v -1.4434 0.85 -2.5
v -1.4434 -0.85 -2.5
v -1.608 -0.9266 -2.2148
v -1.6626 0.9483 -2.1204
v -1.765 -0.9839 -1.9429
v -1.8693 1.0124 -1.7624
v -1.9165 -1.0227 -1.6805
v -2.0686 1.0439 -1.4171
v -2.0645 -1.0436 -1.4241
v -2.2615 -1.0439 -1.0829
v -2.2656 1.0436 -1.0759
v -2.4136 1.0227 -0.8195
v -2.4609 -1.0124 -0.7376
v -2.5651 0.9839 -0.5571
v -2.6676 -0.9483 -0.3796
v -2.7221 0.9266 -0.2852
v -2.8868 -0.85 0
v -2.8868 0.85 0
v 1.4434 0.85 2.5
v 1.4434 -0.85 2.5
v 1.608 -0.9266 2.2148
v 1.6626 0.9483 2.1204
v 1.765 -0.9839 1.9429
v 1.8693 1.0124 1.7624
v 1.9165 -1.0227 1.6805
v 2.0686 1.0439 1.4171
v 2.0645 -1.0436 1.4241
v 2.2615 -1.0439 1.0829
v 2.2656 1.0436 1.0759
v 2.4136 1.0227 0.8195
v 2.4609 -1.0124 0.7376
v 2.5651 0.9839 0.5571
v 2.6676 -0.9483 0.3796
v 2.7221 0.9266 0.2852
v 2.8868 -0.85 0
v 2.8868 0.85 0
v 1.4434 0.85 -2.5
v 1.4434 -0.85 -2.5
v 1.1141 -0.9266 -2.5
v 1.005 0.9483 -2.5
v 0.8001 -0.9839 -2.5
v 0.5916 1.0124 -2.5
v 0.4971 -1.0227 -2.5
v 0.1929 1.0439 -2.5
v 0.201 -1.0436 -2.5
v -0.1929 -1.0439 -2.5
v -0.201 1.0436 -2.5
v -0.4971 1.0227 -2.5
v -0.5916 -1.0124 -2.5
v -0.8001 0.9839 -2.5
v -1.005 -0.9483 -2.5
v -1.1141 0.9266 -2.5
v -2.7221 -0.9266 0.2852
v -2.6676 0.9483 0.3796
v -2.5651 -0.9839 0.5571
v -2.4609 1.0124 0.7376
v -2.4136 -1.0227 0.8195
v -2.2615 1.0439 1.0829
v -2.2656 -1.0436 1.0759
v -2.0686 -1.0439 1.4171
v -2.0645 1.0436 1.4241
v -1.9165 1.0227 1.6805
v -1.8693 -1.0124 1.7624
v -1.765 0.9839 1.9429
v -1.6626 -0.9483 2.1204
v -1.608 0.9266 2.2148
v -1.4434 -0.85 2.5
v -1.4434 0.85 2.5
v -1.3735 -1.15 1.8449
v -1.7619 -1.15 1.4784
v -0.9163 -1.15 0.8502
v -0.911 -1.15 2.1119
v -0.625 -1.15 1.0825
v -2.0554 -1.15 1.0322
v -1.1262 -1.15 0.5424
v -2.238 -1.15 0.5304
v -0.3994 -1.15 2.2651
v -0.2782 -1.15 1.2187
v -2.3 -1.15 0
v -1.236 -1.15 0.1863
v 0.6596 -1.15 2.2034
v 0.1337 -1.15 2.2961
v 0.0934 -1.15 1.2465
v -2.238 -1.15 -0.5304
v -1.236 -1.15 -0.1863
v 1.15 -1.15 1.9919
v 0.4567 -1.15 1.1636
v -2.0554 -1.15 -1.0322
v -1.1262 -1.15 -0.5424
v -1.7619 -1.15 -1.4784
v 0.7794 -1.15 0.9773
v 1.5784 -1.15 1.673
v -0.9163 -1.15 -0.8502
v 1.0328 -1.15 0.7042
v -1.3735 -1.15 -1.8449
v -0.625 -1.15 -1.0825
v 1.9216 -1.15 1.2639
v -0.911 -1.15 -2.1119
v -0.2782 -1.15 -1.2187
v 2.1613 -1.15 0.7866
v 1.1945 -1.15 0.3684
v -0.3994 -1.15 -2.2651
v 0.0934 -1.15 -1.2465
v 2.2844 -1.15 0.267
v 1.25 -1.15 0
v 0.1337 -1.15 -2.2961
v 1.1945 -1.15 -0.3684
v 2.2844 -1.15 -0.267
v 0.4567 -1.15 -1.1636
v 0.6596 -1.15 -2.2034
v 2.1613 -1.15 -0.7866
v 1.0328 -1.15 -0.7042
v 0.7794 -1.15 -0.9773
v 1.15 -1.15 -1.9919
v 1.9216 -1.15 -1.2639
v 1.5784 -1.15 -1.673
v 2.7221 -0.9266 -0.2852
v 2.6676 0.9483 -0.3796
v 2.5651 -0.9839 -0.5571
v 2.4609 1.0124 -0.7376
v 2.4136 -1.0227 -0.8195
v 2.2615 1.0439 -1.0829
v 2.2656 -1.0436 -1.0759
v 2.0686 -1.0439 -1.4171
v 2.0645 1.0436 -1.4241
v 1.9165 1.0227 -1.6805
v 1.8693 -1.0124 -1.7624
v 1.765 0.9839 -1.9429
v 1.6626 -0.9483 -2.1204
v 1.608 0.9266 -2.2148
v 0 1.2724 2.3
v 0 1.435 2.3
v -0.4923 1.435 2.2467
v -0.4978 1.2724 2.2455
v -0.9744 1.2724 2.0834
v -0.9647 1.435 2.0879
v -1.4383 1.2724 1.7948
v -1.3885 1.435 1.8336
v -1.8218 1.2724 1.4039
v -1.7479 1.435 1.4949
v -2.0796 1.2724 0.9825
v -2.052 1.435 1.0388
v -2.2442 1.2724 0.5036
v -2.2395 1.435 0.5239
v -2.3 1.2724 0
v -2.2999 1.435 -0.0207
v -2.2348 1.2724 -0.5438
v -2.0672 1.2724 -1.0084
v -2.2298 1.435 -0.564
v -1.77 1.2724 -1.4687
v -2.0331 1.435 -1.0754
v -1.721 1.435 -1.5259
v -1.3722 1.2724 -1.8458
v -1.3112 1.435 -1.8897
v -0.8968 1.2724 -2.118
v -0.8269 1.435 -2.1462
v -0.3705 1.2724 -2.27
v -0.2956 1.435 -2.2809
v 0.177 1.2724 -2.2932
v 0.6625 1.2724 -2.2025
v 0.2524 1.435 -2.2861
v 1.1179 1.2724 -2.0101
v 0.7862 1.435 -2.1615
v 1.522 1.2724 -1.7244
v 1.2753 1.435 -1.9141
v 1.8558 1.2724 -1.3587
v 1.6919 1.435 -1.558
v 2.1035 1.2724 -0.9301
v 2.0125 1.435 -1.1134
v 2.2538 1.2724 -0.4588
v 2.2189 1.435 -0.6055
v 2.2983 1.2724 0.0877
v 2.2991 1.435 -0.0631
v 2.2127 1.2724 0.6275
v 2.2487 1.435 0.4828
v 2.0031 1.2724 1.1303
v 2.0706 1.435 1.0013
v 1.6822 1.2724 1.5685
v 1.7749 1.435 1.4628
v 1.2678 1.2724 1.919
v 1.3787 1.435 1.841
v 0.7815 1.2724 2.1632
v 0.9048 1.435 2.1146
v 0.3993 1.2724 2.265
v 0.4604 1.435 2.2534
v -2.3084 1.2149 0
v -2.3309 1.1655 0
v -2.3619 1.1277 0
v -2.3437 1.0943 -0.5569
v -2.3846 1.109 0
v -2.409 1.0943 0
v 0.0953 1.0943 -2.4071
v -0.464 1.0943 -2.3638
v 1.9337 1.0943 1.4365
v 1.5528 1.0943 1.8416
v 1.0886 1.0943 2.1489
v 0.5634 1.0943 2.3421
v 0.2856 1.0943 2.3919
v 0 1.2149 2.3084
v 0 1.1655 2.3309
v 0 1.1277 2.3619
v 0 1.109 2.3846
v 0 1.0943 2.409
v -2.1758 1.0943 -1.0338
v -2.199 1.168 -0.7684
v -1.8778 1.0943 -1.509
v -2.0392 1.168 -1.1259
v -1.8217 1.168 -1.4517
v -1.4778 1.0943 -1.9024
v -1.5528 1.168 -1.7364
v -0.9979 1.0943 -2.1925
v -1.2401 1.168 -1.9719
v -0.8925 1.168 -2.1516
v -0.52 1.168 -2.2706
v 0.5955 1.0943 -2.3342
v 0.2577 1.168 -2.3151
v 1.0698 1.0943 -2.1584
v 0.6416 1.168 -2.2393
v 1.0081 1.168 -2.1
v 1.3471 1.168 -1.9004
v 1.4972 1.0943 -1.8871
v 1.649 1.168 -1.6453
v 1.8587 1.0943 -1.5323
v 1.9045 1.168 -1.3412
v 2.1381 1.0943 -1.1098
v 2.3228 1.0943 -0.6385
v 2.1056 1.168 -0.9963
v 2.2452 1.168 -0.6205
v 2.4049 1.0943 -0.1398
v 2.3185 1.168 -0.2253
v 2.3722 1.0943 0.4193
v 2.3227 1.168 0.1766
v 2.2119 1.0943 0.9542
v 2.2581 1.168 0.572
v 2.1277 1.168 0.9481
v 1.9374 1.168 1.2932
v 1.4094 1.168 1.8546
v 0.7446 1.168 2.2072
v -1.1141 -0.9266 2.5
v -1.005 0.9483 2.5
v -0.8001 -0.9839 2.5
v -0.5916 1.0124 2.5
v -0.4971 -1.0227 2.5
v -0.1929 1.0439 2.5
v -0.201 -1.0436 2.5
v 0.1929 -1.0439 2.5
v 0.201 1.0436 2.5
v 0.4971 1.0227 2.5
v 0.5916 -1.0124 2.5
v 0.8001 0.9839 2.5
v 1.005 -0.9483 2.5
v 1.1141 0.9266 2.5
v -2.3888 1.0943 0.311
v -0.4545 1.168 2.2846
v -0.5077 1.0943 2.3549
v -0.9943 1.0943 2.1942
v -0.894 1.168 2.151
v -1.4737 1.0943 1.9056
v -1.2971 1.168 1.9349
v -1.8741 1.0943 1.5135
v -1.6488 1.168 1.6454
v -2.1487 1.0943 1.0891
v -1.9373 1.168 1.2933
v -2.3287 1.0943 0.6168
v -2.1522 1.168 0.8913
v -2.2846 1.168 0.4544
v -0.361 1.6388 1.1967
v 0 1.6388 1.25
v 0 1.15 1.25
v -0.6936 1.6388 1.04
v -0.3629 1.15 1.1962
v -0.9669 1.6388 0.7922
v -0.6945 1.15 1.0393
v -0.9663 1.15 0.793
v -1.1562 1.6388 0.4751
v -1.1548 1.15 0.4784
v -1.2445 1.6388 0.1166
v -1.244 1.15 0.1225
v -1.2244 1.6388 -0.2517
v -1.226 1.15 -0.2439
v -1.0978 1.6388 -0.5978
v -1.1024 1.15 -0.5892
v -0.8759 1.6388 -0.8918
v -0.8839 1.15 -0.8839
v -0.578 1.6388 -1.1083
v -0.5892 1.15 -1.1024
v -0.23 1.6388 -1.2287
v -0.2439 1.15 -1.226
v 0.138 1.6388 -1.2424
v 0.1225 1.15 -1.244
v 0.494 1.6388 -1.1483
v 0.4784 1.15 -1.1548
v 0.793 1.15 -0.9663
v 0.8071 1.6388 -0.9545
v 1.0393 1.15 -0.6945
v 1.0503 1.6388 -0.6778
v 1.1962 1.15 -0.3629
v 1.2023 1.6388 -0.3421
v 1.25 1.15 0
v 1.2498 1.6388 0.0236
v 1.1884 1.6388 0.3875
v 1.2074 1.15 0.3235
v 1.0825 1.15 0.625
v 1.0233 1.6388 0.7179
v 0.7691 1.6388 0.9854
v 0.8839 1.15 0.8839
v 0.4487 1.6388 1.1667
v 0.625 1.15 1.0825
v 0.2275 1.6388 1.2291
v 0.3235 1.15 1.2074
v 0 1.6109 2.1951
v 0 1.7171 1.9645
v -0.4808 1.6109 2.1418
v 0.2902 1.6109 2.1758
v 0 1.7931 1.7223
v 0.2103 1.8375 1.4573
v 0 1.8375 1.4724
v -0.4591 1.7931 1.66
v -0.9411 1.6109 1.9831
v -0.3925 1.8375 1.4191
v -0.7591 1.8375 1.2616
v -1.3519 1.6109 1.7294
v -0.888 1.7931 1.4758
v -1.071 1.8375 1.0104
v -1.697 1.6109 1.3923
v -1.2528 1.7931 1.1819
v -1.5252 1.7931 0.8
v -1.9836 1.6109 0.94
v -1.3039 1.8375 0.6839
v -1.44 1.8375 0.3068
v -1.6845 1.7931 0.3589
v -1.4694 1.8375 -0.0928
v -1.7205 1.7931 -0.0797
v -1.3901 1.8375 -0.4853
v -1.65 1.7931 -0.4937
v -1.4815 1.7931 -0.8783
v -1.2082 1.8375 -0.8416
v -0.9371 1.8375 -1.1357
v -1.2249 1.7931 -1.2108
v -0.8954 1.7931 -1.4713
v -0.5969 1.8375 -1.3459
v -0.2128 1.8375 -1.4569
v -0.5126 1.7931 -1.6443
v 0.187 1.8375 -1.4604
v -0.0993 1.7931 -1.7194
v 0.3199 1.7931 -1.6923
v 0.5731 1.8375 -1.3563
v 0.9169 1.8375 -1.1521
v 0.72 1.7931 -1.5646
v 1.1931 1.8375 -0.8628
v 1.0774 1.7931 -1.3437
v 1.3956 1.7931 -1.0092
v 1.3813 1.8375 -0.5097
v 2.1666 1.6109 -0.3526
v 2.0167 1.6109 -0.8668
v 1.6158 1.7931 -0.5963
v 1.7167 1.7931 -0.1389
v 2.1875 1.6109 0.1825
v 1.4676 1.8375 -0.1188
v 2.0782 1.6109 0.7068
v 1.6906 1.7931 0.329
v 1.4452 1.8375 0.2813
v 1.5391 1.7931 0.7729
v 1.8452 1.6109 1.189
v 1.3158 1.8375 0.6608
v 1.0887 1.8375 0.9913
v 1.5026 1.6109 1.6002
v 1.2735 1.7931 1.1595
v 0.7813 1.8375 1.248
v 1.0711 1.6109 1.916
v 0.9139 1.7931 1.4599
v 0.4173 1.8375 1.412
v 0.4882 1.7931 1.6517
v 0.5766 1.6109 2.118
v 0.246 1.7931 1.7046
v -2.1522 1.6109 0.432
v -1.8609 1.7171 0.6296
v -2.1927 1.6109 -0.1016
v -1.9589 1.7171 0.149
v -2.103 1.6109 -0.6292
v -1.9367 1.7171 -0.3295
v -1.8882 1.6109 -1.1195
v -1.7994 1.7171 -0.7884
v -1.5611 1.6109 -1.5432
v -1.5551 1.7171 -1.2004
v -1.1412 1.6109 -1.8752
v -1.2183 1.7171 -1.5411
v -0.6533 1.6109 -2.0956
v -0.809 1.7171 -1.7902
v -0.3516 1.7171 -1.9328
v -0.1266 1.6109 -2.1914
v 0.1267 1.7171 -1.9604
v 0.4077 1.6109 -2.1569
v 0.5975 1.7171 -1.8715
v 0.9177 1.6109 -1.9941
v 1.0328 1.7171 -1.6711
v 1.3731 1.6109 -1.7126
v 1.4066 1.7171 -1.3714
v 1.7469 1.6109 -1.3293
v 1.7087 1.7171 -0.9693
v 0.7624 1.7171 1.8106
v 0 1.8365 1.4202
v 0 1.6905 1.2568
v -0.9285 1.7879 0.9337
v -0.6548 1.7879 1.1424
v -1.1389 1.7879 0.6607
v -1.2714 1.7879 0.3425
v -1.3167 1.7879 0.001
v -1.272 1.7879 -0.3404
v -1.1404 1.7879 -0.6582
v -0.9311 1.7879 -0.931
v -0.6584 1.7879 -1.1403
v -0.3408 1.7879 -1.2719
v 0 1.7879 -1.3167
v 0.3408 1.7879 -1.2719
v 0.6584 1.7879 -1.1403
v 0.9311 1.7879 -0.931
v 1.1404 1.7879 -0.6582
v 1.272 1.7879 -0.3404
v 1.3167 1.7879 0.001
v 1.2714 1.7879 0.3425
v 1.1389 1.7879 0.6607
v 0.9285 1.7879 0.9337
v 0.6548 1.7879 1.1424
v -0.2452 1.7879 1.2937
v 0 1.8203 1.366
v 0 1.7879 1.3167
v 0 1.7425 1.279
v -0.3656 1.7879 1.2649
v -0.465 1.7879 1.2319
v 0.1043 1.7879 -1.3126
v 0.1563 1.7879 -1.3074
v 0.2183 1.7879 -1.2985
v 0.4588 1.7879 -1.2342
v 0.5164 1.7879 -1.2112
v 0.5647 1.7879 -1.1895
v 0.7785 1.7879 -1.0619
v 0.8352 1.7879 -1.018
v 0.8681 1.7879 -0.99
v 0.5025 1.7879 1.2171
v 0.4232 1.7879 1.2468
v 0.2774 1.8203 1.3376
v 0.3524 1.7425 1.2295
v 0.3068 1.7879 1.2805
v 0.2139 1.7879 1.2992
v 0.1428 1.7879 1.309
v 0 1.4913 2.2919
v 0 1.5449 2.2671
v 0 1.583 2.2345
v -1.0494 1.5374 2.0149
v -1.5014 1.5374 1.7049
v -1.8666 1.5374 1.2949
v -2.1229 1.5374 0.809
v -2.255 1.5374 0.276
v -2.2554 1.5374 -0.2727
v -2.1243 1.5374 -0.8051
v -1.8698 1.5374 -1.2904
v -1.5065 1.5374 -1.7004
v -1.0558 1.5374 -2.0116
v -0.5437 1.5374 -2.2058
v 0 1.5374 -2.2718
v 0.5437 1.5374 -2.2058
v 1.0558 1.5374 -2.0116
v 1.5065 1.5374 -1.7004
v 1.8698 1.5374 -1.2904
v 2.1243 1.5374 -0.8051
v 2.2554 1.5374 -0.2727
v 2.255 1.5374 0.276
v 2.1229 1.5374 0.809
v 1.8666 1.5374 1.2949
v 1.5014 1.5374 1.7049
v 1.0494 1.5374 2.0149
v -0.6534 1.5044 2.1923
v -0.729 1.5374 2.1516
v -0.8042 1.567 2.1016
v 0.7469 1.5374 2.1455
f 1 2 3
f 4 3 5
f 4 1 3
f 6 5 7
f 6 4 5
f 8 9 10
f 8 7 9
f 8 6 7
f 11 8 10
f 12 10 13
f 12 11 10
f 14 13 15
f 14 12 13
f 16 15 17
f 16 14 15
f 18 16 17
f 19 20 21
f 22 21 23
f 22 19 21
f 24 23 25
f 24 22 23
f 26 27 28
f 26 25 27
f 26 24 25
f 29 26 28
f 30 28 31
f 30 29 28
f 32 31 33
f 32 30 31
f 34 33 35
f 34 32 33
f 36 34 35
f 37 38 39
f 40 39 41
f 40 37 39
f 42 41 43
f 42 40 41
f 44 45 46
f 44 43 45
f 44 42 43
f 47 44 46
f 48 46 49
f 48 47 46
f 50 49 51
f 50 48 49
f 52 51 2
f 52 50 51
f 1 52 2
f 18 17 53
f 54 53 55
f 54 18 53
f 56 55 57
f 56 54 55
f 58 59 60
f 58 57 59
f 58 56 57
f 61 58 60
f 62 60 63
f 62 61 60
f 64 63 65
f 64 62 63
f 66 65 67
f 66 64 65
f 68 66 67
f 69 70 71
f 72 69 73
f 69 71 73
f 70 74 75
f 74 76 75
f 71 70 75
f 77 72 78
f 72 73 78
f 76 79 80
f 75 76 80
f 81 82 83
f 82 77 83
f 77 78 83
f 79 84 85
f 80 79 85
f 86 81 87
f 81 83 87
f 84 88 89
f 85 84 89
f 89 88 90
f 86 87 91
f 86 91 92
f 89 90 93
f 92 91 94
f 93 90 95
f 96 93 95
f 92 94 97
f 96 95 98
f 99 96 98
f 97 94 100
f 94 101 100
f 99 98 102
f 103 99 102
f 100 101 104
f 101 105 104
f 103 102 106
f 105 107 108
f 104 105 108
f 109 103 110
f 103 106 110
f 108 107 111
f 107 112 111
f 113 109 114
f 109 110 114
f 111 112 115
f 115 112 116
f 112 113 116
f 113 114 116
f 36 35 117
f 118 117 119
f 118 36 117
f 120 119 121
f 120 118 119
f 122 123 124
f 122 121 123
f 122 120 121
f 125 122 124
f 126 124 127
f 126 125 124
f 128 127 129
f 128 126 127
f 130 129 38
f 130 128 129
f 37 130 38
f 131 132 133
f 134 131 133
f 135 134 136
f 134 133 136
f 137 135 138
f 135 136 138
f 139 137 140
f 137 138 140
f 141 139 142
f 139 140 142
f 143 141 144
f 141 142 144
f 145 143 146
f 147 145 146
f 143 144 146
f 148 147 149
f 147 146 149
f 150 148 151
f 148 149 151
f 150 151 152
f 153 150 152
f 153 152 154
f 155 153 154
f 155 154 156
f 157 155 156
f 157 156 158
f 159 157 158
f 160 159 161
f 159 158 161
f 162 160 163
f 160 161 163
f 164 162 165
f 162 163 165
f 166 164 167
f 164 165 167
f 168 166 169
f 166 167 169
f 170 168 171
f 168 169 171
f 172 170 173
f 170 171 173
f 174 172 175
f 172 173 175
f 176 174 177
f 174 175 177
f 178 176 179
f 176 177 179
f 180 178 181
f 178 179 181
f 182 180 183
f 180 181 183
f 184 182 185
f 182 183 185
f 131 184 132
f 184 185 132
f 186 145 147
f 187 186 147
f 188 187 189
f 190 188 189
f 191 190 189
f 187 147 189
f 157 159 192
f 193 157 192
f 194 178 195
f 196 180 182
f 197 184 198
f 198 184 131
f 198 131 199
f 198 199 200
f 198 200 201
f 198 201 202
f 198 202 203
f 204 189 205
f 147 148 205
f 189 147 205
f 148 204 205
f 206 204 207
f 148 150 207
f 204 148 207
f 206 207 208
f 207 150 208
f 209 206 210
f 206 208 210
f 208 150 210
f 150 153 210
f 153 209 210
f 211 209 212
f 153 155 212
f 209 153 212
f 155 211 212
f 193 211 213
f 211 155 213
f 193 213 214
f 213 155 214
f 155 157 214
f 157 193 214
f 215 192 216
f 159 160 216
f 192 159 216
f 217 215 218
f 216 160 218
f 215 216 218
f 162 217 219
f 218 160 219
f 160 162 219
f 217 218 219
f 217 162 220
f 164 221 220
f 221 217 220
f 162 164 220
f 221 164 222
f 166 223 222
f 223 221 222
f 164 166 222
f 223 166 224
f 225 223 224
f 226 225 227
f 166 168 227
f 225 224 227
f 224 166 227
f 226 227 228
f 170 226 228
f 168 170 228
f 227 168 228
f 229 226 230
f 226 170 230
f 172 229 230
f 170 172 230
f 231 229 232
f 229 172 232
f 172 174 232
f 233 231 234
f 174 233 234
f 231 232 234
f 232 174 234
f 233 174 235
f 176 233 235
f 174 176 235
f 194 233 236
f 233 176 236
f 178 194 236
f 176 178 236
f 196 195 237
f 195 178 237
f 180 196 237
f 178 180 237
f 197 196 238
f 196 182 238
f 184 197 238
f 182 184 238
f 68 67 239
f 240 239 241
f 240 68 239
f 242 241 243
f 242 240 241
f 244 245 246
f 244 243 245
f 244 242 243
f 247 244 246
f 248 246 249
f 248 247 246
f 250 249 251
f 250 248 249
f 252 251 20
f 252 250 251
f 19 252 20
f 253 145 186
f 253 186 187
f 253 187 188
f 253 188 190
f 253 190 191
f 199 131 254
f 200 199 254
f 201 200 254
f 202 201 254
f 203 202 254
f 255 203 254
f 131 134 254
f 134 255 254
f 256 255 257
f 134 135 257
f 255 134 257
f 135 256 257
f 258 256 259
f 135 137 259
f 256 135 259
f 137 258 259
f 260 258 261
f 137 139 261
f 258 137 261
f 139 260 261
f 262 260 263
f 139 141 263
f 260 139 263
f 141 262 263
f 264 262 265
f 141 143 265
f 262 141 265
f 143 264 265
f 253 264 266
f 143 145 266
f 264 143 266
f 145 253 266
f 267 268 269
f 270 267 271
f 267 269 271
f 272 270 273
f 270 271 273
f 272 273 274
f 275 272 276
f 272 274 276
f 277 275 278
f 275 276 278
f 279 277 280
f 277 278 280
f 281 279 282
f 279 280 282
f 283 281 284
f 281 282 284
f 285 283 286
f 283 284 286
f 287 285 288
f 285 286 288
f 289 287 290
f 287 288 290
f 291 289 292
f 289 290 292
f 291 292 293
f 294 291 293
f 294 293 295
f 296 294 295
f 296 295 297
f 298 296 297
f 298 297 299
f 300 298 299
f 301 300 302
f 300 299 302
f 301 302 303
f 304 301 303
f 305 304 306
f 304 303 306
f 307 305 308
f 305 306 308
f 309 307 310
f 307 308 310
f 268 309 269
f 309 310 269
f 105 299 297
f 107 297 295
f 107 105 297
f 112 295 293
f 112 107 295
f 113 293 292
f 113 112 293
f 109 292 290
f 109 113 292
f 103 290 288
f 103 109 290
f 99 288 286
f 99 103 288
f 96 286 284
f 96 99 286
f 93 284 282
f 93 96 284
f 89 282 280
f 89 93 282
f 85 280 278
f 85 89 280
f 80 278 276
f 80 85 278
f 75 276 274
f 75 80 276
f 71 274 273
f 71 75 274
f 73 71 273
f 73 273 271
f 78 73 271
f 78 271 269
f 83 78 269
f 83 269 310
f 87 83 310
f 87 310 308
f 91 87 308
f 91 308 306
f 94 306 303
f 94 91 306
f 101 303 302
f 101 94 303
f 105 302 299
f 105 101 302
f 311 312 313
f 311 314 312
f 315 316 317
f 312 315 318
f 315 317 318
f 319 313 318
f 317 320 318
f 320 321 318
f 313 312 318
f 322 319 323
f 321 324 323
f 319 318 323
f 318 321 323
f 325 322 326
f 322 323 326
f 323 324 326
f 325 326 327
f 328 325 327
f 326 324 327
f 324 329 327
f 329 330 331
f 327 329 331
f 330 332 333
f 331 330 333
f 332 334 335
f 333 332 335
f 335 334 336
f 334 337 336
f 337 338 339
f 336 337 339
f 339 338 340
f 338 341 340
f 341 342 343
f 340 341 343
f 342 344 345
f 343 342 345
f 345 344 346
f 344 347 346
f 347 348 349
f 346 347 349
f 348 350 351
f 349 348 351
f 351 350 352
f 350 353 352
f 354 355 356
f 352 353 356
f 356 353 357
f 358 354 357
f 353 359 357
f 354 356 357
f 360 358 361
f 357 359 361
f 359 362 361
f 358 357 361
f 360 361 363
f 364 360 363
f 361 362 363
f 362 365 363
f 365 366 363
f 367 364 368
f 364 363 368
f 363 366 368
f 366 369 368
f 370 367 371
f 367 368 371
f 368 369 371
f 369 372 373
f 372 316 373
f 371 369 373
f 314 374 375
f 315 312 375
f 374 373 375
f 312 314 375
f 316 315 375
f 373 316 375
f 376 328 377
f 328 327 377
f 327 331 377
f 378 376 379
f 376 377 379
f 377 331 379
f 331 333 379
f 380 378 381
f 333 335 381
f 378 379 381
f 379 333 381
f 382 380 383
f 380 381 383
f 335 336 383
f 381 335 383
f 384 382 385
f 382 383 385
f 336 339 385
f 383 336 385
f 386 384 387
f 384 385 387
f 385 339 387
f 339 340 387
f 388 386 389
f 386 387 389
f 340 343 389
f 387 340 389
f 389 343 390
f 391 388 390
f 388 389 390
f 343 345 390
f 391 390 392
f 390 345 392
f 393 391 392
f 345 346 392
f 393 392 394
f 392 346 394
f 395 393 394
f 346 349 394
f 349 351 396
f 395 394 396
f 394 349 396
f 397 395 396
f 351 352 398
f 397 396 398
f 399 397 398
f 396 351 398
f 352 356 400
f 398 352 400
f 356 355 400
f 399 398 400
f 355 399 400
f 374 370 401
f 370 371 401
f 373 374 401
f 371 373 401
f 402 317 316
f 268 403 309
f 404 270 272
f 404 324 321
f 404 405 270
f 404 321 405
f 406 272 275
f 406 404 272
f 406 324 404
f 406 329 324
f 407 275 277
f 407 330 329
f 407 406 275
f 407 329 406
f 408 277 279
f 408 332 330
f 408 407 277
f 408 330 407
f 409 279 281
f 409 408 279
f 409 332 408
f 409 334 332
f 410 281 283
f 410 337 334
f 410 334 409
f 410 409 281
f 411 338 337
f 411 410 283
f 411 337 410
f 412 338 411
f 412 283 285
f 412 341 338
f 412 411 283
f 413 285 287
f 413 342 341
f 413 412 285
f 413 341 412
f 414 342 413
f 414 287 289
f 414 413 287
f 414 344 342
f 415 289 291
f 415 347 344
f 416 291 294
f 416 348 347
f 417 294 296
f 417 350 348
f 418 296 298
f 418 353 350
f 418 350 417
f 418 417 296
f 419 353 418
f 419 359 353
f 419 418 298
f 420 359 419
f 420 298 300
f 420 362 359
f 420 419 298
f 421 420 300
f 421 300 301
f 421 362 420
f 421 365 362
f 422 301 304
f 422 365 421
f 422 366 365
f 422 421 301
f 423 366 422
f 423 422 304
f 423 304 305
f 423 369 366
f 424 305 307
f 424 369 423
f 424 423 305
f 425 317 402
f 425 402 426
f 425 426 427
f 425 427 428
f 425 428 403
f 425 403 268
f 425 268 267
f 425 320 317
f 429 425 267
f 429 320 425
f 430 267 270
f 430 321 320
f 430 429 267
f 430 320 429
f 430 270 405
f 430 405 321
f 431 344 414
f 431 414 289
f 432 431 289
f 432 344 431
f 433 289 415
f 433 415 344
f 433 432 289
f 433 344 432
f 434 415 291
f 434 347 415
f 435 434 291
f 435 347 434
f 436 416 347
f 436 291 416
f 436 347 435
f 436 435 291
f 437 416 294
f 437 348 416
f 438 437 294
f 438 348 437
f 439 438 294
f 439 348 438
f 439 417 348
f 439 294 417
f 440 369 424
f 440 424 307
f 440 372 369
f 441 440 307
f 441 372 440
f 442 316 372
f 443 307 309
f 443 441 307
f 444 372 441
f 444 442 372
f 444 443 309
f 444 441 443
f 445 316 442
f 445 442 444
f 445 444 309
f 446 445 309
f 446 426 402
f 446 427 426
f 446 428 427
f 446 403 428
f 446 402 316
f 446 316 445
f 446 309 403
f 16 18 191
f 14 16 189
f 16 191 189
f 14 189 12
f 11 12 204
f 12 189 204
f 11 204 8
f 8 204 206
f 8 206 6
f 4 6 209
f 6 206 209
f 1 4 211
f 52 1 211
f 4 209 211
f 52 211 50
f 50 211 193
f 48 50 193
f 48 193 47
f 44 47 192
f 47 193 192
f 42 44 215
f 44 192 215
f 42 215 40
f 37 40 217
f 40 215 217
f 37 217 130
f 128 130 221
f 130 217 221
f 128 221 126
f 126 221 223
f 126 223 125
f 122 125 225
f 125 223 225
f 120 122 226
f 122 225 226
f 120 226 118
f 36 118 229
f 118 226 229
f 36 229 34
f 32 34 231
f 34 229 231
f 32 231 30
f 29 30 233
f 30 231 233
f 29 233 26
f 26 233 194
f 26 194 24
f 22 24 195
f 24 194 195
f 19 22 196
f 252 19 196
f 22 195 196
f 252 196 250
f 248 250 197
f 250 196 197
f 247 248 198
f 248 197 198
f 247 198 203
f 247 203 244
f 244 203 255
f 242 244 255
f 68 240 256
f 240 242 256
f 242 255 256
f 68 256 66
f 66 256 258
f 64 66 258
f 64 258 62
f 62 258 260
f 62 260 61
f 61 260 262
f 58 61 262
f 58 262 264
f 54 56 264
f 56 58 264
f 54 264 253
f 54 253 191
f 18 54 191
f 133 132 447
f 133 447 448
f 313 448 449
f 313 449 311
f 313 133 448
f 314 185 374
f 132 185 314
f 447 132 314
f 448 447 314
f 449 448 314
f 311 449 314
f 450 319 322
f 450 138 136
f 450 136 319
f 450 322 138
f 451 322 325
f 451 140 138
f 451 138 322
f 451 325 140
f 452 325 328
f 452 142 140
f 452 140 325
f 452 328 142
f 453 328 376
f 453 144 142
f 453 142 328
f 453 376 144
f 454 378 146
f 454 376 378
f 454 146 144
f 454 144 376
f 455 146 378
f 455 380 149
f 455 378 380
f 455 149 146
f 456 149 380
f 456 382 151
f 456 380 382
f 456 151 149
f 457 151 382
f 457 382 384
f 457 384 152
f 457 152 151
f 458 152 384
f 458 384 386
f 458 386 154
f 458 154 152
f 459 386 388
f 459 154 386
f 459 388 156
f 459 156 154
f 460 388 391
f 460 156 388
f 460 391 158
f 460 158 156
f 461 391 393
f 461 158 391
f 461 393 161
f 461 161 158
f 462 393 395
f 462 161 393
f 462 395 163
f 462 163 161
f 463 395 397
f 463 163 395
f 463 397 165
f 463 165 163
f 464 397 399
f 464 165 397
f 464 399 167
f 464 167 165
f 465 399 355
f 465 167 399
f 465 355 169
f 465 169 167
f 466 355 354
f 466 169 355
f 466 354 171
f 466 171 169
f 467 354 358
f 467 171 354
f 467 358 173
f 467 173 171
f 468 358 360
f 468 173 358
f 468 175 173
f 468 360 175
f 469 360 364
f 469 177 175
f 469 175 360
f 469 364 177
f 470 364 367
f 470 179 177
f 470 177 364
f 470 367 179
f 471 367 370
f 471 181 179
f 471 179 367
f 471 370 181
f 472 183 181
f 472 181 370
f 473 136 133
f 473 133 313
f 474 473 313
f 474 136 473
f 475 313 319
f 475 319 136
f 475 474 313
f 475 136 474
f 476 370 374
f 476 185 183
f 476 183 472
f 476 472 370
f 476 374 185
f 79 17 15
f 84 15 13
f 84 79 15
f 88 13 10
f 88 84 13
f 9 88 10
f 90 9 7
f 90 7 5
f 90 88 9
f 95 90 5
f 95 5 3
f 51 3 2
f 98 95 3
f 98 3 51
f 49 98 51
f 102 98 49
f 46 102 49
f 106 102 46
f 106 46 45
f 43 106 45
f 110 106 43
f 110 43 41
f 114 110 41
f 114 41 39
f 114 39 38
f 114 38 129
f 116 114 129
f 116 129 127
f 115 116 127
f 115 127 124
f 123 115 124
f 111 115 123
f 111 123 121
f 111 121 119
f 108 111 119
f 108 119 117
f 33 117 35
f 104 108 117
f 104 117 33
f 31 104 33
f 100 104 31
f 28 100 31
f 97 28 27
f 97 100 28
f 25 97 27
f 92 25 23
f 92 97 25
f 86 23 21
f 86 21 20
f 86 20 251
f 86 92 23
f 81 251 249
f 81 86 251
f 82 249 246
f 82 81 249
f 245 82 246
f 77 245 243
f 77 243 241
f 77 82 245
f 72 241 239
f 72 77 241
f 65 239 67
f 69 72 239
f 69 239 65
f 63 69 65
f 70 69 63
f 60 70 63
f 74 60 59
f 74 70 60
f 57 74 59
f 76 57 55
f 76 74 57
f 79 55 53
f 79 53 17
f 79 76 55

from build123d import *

# Parameters (mm, degrees)
SKETCH_1_R      = 1.25
EXTRUDE_1_DEPTH = 1.15
FILLET_1_R      = 0.2


with BuildPart() as part:
    # 草图1 → 凸台-拉伸1 (new body, symmetric)
    with BuildSketch(Plane(origin=(0, 0, 0), x_dir=(1, 0, 0), z_dir=(0, 1, 0))):
        Polygon((2.886751346, 0), (1.443375673, 2.5), (-1.443375673, 2.5), (-2.886751346, 0), (-1.443375673, -2.5), (1.443375673, -2.5), align=None)
        Circle(SKETCH_1_R, mode=Mode.SUBTRACT)
    extrude(amount=EXTRUDE_1_DEPTH, both=True)

    # 草图2 → 切除-旋转1 (revolve, cut)
    with BuildSketch(Plane.XY):
        Polygon((-2.886751346, 0.85), (-2.3, 1.15), (-2.886751346, 1.15), align=None)
    cut_revolve_1 = revolve(axis=Axis((0, 1.15, 0), (0, -1, 0)), mode=Mode.SUBTRACT)

    # 镜向1: 切除-旋转1 across plane
    add(cut_revolve_1.mirror(Plane.ZX), mode=Mode.SUBTRACT)

    # 草图3 → 旋转1 (revolve)
    with BuildSketch(Plane(origin=(0, 0, 0), x_dir=(0, 0, -1), z_dir=(1, 0, 0))):
        with BuildLine():
            Line((-2.3, 1.15), (-2.3, 1.55))
            ThreePointArc((-2.3, 1.55), (-1.796008242, 1.773528846), (-1.25, 1.85))
            Line((-1.25, 1.85), (-1.25, 1.15))
            Line((-1.25, 1.15), (-2.3, 1.15))
        make_face()
    revolve(axis=Axis((0, 1.15, 0), (0, -1, 0)))

    # 圆角1
    fillet_1_edges = [part.edges().sort_by_distance(p)[0] for p in [
        (1.626345597, 1.15, -1.626345597),
        (0, 1.55, -2.3),
        (0, 1.85, -1.25),
    ]]
    fillet(fillet_1_edges, radius=FILLET_1_R)


solid = part.part
